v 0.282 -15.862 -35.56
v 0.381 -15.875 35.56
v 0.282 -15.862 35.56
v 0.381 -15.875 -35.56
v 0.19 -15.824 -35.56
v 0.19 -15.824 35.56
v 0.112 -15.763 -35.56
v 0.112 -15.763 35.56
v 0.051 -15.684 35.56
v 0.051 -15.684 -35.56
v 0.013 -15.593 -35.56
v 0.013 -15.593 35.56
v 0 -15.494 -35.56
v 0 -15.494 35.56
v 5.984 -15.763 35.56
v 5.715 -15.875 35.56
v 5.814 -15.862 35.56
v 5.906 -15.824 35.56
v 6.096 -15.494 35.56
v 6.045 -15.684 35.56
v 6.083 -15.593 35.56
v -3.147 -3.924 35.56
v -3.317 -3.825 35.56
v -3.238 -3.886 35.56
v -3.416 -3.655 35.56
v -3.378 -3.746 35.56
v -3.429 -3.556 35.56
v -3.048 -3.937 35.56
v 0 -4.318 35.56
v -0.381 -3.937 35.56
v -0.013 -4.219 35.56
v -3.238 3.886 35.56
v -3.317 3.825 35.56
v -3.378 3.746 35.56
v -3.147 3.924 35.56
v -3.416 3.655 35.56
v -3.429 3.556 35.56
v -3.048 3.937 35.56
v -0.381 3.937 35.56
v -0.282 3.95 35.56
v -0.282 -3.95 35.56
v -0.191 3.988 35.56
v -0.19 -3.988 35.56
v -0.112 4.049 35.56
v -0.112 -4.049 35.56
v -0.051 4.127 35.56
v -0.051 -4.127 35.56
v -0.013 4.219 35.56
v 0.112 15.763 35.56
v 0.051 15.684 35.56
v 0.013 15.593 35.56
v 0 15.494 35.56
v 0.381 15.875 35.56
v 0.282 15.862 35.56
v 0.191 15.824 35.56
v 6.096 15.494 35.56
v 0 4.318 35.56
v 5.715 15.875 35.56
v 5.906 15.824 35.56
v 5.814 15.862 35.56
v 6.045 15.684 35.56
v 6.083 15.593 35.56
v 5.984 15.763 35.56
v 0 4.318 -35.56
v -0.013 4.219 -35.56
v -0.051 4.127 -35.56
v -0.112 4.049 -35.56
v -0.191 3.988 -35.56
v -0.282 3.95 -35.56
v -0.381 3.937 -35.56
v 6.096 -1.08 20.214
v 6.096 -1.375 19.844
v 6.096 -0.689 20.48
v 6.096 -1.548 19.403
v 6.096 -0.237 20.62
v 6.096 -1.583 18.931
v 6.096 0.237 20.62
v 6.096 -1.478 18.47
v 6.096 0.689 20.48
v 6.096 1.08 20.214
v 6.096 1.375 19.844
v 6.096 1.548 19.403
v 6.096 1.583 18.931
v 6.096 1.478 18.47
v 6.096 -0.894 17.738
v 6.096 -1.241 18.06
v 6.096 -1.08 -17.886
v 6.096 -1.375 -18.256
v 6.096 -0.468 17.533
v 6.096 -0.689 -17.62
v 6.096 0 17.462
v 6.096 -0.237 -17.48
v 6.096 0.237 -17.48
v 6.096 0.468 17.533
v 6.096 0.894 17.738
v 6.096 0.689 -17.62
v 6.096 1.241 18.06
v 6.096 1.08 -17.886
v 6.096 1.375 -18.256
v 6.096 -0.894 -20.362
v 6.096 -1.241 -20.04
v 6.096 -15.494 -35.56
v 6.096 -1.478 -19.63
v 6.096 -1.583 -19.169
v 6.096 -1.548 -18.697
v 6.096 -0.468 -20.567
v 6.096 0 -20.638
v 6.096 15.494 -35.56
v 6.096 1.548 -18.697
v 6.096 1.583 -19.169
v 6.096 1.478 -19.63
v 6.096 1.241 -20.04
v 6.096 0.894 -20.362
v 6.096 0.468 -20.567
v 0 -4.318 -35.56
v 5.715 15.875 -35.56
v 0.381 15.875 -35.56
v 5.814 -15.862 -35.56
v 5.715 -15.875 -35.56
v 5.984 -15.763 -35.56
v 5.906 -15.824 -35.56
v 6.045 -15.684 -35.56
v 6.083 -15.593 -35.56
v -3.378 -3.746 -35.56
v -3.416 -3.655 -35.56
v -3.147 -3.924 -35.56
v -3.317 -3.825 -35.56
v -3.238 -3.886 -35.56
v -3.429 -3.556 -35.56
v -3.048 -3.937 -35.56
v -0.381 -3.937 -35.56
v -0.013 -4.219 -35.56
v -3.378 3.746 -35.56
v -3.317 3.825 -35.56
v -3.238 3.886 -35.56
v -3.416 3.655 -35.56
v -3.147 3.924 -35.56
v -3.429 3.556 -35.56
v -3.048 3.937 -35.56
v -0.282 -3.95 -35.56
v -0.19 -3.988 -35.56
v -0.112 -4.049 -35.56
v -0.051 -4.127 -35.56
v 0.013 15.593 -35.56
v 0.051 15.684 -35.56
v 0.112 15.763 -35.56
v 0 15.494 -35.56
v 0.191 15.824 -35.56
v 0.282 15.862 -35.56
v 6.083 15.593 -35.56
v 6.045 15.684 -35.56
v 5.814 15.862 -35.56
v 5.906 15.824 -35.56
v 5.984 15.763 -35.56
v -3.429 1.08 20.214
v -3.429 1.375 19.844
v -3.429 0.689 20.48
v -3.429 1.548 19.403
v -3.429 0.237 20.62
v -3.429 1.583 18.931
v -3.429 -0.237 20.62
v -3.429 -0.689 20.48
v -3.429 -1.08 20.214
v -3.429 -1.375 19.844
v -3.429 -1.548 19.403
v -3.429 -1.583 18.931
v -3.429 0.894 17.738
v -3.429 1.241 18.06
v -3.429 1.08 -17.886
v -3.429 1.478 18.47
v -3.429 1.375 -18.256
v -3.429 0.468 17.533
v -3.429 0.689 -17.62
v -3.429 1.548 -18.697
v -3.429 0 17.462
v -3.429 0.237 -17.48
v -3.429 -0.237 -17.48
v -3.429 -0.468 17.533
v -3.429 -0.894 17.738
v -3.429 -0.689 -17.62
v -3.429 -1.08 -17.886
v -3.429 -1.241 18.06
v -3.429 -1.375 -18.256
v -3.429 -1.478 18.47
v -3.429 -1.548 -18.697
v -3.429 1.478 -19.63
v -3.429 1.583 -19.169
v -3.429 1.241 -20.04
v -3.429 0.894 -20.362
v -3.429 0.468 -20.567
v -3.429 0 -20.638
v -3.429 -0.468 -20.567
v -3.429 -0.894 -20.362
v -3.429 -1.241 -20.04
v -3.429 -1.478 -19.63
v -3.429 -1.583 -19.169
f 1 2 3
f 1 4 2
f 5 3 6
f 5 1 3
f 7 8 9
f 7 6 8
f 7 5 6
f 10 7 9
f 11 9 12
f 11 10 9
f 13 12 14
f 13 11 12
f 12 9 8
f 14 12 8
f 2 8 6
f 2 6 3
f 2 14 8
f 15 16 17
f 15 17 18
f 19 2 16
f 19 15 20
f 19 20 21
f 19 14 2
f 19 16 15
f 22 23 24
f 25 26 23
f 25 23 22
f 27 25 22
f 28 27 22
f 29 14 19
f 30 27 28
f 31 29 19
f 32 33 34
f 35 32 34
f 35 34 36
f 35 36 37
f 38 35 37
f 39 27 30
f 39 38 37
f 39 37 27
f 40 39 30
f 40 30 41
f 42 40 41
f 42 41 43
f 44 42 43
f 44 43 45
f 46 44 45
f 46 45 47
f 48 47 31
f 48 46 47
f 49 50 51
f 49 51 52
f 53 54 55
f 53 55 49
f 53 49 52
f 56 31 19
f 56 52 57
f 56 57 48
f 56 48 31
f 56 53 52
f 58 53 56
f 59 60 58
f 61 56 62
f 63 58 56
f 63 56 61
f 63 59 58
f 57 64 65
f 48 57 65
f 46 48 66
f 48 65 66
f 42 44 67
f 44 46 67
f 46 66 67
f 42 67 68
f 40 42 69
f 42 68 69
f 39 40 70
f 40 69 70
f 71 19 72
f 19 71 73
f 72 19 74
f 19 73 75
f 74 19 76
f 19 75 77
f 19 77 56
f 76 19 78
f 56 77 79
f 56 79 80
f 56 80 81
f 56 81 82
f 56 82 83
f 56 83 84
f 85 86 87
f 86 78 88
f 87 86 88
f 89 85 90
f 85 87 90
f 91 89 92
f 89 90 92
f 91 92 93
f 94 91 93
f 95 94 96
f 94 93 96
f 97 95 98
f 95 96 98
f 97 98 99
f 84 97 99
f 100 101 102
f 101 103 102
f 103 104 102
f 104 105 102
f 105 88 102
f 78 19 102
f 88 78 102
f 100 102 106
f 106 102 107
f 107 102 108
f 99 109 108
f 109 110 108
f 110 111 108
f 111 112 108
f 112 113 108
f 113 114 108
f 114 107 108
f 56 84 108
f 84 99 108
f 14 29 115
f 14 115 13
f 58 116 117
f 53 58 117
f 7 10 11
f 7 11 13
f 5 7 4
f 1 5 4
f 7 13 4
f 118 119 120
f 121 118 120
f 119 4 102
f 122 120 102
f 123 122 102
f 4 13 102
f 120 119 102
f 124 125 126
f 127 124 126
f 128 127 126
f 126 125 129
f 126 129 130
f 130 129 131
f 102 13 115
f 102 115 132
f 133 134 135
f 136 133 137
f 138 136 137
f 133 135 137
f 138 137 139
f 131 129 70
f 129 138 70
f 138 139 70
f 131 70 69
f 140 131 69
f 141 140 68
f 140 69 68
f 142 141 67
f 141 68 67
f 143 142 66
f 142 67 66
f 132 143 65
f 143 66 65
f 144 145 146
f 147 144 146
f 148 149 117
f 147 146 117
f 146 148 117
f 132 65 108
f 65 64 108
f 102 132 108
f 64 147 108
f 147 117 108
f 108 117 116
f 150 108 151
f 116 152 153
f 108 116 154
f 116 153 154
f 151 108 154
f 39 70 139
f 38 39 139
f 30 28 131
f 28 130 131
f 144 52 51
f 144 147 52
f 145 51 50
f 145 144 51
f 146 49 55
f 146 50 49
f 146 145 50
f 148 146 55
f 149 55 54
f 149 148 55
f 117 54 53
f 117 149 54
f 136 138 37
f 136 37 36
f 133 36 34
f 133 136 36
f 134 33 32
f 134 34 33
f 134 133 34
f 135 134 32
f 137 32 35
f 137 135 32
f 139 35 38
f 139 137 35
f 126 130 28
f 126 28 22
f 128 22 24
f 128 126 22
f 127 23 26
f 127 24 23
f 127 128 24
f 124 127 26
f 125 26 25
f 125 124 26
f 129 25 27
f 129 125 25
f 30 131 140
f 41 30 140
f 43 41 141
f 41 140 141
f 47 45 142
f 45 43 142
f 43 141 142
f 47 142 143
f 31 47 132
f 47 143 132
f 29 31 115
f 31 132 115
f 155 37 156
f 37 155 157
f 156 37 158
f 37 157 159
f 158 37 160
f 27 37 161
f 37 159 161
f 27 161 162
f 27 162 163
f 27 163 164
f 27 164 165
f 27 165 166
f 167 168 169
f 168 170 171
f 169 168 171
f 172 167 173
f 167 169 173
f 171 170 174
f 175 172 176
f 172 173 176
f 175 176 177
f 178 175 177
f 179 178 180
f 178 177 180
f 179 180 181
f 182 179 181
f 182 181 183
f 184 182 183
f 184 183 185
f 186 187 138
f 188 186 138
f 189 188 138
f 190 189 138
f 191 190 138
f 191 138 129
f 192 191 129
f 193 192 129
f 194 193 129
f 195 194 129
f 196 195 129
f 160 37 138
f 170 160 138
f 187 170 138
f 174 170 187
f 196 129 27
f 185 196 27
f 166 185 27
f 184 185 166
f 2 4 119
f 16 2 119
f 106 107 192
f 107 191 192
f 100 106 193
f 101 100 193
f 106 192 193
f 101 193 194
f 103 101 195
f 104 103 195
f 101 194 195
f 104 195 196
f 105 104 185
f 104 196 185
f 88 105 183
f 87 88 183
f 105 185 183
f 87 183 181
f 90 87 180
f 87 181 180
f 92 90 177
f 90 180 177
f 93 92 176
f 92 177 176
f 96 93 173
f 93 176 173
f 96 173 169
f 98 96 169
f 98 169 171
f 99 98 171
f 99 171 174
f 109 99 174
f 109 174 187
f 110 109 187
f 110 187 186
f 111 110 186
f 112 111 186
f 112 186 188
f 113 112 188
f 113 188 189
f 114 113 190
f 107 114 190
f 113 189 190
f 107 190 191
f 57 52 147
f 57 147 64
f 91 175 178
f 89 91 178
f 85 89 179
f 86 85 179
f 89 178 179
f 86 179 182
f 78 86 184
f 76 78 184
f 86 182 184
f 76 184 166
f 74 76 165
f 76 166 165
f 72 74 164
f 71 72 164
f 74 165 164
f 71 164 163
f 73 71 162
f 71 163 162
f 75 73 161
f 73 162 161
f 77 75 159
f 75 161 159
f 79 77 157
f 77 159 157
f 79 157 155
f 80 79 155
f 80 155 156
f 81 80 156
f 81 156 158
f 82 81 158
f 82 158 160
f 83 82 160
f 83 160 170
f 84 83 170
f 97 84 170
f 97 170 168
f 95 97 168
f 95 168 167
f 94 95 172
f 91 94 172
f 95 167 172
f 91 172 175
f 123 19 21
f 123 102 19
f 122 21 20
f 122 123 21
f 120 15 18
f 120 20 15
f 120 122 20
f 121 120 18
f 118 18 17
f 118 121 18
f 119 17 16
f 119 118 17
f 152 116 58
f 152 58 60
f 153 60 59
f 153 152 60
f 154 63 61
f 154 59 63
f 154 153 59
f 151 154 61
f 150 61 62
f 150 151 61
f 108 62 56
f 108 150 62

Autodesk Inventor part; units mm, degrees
sketch "Sketch_5" plane through (0, 0, 0) normal (0, 0, 1) x (1, 0, 0)
  line L0 (-3.429, 3.556) -> (-3.429, -3.556)
  arc A0 (-3.429, -3.556) -> (-3.048, -3.937) centre (-3.048, -3.556) ccw
  line L1 (-3.048, -3.937) -> (-0.381, -3.937)
  arc A1 (0, -4.318) -> (-0.381, -3.937) centre (-0.381, -4.318) ccw
  line L2 (0, -4.318) -> (0, -15.494)
  arc A2 (0, -15.494) -> (0.381, -15.875) centre (0.381, -15.494) ccw
  line L3 (0.381, -15.875) -> (5.715, -15.875)
  arc A3 (5.715, -15.875) -> (6.096, -15.494) centre (5.715, -15.494) ccw
  line L4 (6.096, -15.494) -> (6.096, 15.494)
  arc A4 (6.096, 15.494) -> (5.715, 15.875) centre (5.715, 15.494) ccw
  line L5 (5.715, 15.875) -> (0.381, 15.875)
  arc A5 (0.381, 15.875) -> (0, 15.494) centre (0.381, 15.494) ccw
  line L6 (0, 15.494) -> (0, 4.318)
  arc A6 (-0.381, 3.937) -> (0, 4.318) centre (-0.381, 4.318) ccw
  line L7 (-0.381, 3.937) -> (-3.048, 3.937)
  arc A7 (-3.048, 3.937) -> (-3.429, 3.556) centre (-3.048, 3.556) ccw
extrude "Extrusion1" add sketch "Sketch_5" along normal mid plane 71.12
sketch "Sketch2" plane through (6.096, -15.494, 35.56) normal (1, 0, 0) x (0, 0, -1)
  point P0 (16.51, 15.494)
hole "Hole1" at (6.096, 0, 19.05) direction (-1, 0, 0) diameter 3.175 depth 9.525
sketch "Sketch3" plane through (6.096, -15.494, 35.56) normal (1, 0, 0) x (0, 0, -1)
  point P0 (54.61, 15.494)
hole "Hole2" at (6.096, 0, -19.05) direction (-1, 0, 0) diameter 3.175 depth 9.525
ref_plane "p1_XY" through (6.096, 0, 19.05) normal (1, 0, 0) x (0, 0, -1)
ref_plane "p1_YZ" through (6.096, 0, 19.05) normal (0, 0, -1) x (0, 1, 0)
ref_plane "p1_ZX" through (6.096, 0, 19.05) normal (0, 1, 0) x (1, 0, 0)
properties part number "6825_p2"
